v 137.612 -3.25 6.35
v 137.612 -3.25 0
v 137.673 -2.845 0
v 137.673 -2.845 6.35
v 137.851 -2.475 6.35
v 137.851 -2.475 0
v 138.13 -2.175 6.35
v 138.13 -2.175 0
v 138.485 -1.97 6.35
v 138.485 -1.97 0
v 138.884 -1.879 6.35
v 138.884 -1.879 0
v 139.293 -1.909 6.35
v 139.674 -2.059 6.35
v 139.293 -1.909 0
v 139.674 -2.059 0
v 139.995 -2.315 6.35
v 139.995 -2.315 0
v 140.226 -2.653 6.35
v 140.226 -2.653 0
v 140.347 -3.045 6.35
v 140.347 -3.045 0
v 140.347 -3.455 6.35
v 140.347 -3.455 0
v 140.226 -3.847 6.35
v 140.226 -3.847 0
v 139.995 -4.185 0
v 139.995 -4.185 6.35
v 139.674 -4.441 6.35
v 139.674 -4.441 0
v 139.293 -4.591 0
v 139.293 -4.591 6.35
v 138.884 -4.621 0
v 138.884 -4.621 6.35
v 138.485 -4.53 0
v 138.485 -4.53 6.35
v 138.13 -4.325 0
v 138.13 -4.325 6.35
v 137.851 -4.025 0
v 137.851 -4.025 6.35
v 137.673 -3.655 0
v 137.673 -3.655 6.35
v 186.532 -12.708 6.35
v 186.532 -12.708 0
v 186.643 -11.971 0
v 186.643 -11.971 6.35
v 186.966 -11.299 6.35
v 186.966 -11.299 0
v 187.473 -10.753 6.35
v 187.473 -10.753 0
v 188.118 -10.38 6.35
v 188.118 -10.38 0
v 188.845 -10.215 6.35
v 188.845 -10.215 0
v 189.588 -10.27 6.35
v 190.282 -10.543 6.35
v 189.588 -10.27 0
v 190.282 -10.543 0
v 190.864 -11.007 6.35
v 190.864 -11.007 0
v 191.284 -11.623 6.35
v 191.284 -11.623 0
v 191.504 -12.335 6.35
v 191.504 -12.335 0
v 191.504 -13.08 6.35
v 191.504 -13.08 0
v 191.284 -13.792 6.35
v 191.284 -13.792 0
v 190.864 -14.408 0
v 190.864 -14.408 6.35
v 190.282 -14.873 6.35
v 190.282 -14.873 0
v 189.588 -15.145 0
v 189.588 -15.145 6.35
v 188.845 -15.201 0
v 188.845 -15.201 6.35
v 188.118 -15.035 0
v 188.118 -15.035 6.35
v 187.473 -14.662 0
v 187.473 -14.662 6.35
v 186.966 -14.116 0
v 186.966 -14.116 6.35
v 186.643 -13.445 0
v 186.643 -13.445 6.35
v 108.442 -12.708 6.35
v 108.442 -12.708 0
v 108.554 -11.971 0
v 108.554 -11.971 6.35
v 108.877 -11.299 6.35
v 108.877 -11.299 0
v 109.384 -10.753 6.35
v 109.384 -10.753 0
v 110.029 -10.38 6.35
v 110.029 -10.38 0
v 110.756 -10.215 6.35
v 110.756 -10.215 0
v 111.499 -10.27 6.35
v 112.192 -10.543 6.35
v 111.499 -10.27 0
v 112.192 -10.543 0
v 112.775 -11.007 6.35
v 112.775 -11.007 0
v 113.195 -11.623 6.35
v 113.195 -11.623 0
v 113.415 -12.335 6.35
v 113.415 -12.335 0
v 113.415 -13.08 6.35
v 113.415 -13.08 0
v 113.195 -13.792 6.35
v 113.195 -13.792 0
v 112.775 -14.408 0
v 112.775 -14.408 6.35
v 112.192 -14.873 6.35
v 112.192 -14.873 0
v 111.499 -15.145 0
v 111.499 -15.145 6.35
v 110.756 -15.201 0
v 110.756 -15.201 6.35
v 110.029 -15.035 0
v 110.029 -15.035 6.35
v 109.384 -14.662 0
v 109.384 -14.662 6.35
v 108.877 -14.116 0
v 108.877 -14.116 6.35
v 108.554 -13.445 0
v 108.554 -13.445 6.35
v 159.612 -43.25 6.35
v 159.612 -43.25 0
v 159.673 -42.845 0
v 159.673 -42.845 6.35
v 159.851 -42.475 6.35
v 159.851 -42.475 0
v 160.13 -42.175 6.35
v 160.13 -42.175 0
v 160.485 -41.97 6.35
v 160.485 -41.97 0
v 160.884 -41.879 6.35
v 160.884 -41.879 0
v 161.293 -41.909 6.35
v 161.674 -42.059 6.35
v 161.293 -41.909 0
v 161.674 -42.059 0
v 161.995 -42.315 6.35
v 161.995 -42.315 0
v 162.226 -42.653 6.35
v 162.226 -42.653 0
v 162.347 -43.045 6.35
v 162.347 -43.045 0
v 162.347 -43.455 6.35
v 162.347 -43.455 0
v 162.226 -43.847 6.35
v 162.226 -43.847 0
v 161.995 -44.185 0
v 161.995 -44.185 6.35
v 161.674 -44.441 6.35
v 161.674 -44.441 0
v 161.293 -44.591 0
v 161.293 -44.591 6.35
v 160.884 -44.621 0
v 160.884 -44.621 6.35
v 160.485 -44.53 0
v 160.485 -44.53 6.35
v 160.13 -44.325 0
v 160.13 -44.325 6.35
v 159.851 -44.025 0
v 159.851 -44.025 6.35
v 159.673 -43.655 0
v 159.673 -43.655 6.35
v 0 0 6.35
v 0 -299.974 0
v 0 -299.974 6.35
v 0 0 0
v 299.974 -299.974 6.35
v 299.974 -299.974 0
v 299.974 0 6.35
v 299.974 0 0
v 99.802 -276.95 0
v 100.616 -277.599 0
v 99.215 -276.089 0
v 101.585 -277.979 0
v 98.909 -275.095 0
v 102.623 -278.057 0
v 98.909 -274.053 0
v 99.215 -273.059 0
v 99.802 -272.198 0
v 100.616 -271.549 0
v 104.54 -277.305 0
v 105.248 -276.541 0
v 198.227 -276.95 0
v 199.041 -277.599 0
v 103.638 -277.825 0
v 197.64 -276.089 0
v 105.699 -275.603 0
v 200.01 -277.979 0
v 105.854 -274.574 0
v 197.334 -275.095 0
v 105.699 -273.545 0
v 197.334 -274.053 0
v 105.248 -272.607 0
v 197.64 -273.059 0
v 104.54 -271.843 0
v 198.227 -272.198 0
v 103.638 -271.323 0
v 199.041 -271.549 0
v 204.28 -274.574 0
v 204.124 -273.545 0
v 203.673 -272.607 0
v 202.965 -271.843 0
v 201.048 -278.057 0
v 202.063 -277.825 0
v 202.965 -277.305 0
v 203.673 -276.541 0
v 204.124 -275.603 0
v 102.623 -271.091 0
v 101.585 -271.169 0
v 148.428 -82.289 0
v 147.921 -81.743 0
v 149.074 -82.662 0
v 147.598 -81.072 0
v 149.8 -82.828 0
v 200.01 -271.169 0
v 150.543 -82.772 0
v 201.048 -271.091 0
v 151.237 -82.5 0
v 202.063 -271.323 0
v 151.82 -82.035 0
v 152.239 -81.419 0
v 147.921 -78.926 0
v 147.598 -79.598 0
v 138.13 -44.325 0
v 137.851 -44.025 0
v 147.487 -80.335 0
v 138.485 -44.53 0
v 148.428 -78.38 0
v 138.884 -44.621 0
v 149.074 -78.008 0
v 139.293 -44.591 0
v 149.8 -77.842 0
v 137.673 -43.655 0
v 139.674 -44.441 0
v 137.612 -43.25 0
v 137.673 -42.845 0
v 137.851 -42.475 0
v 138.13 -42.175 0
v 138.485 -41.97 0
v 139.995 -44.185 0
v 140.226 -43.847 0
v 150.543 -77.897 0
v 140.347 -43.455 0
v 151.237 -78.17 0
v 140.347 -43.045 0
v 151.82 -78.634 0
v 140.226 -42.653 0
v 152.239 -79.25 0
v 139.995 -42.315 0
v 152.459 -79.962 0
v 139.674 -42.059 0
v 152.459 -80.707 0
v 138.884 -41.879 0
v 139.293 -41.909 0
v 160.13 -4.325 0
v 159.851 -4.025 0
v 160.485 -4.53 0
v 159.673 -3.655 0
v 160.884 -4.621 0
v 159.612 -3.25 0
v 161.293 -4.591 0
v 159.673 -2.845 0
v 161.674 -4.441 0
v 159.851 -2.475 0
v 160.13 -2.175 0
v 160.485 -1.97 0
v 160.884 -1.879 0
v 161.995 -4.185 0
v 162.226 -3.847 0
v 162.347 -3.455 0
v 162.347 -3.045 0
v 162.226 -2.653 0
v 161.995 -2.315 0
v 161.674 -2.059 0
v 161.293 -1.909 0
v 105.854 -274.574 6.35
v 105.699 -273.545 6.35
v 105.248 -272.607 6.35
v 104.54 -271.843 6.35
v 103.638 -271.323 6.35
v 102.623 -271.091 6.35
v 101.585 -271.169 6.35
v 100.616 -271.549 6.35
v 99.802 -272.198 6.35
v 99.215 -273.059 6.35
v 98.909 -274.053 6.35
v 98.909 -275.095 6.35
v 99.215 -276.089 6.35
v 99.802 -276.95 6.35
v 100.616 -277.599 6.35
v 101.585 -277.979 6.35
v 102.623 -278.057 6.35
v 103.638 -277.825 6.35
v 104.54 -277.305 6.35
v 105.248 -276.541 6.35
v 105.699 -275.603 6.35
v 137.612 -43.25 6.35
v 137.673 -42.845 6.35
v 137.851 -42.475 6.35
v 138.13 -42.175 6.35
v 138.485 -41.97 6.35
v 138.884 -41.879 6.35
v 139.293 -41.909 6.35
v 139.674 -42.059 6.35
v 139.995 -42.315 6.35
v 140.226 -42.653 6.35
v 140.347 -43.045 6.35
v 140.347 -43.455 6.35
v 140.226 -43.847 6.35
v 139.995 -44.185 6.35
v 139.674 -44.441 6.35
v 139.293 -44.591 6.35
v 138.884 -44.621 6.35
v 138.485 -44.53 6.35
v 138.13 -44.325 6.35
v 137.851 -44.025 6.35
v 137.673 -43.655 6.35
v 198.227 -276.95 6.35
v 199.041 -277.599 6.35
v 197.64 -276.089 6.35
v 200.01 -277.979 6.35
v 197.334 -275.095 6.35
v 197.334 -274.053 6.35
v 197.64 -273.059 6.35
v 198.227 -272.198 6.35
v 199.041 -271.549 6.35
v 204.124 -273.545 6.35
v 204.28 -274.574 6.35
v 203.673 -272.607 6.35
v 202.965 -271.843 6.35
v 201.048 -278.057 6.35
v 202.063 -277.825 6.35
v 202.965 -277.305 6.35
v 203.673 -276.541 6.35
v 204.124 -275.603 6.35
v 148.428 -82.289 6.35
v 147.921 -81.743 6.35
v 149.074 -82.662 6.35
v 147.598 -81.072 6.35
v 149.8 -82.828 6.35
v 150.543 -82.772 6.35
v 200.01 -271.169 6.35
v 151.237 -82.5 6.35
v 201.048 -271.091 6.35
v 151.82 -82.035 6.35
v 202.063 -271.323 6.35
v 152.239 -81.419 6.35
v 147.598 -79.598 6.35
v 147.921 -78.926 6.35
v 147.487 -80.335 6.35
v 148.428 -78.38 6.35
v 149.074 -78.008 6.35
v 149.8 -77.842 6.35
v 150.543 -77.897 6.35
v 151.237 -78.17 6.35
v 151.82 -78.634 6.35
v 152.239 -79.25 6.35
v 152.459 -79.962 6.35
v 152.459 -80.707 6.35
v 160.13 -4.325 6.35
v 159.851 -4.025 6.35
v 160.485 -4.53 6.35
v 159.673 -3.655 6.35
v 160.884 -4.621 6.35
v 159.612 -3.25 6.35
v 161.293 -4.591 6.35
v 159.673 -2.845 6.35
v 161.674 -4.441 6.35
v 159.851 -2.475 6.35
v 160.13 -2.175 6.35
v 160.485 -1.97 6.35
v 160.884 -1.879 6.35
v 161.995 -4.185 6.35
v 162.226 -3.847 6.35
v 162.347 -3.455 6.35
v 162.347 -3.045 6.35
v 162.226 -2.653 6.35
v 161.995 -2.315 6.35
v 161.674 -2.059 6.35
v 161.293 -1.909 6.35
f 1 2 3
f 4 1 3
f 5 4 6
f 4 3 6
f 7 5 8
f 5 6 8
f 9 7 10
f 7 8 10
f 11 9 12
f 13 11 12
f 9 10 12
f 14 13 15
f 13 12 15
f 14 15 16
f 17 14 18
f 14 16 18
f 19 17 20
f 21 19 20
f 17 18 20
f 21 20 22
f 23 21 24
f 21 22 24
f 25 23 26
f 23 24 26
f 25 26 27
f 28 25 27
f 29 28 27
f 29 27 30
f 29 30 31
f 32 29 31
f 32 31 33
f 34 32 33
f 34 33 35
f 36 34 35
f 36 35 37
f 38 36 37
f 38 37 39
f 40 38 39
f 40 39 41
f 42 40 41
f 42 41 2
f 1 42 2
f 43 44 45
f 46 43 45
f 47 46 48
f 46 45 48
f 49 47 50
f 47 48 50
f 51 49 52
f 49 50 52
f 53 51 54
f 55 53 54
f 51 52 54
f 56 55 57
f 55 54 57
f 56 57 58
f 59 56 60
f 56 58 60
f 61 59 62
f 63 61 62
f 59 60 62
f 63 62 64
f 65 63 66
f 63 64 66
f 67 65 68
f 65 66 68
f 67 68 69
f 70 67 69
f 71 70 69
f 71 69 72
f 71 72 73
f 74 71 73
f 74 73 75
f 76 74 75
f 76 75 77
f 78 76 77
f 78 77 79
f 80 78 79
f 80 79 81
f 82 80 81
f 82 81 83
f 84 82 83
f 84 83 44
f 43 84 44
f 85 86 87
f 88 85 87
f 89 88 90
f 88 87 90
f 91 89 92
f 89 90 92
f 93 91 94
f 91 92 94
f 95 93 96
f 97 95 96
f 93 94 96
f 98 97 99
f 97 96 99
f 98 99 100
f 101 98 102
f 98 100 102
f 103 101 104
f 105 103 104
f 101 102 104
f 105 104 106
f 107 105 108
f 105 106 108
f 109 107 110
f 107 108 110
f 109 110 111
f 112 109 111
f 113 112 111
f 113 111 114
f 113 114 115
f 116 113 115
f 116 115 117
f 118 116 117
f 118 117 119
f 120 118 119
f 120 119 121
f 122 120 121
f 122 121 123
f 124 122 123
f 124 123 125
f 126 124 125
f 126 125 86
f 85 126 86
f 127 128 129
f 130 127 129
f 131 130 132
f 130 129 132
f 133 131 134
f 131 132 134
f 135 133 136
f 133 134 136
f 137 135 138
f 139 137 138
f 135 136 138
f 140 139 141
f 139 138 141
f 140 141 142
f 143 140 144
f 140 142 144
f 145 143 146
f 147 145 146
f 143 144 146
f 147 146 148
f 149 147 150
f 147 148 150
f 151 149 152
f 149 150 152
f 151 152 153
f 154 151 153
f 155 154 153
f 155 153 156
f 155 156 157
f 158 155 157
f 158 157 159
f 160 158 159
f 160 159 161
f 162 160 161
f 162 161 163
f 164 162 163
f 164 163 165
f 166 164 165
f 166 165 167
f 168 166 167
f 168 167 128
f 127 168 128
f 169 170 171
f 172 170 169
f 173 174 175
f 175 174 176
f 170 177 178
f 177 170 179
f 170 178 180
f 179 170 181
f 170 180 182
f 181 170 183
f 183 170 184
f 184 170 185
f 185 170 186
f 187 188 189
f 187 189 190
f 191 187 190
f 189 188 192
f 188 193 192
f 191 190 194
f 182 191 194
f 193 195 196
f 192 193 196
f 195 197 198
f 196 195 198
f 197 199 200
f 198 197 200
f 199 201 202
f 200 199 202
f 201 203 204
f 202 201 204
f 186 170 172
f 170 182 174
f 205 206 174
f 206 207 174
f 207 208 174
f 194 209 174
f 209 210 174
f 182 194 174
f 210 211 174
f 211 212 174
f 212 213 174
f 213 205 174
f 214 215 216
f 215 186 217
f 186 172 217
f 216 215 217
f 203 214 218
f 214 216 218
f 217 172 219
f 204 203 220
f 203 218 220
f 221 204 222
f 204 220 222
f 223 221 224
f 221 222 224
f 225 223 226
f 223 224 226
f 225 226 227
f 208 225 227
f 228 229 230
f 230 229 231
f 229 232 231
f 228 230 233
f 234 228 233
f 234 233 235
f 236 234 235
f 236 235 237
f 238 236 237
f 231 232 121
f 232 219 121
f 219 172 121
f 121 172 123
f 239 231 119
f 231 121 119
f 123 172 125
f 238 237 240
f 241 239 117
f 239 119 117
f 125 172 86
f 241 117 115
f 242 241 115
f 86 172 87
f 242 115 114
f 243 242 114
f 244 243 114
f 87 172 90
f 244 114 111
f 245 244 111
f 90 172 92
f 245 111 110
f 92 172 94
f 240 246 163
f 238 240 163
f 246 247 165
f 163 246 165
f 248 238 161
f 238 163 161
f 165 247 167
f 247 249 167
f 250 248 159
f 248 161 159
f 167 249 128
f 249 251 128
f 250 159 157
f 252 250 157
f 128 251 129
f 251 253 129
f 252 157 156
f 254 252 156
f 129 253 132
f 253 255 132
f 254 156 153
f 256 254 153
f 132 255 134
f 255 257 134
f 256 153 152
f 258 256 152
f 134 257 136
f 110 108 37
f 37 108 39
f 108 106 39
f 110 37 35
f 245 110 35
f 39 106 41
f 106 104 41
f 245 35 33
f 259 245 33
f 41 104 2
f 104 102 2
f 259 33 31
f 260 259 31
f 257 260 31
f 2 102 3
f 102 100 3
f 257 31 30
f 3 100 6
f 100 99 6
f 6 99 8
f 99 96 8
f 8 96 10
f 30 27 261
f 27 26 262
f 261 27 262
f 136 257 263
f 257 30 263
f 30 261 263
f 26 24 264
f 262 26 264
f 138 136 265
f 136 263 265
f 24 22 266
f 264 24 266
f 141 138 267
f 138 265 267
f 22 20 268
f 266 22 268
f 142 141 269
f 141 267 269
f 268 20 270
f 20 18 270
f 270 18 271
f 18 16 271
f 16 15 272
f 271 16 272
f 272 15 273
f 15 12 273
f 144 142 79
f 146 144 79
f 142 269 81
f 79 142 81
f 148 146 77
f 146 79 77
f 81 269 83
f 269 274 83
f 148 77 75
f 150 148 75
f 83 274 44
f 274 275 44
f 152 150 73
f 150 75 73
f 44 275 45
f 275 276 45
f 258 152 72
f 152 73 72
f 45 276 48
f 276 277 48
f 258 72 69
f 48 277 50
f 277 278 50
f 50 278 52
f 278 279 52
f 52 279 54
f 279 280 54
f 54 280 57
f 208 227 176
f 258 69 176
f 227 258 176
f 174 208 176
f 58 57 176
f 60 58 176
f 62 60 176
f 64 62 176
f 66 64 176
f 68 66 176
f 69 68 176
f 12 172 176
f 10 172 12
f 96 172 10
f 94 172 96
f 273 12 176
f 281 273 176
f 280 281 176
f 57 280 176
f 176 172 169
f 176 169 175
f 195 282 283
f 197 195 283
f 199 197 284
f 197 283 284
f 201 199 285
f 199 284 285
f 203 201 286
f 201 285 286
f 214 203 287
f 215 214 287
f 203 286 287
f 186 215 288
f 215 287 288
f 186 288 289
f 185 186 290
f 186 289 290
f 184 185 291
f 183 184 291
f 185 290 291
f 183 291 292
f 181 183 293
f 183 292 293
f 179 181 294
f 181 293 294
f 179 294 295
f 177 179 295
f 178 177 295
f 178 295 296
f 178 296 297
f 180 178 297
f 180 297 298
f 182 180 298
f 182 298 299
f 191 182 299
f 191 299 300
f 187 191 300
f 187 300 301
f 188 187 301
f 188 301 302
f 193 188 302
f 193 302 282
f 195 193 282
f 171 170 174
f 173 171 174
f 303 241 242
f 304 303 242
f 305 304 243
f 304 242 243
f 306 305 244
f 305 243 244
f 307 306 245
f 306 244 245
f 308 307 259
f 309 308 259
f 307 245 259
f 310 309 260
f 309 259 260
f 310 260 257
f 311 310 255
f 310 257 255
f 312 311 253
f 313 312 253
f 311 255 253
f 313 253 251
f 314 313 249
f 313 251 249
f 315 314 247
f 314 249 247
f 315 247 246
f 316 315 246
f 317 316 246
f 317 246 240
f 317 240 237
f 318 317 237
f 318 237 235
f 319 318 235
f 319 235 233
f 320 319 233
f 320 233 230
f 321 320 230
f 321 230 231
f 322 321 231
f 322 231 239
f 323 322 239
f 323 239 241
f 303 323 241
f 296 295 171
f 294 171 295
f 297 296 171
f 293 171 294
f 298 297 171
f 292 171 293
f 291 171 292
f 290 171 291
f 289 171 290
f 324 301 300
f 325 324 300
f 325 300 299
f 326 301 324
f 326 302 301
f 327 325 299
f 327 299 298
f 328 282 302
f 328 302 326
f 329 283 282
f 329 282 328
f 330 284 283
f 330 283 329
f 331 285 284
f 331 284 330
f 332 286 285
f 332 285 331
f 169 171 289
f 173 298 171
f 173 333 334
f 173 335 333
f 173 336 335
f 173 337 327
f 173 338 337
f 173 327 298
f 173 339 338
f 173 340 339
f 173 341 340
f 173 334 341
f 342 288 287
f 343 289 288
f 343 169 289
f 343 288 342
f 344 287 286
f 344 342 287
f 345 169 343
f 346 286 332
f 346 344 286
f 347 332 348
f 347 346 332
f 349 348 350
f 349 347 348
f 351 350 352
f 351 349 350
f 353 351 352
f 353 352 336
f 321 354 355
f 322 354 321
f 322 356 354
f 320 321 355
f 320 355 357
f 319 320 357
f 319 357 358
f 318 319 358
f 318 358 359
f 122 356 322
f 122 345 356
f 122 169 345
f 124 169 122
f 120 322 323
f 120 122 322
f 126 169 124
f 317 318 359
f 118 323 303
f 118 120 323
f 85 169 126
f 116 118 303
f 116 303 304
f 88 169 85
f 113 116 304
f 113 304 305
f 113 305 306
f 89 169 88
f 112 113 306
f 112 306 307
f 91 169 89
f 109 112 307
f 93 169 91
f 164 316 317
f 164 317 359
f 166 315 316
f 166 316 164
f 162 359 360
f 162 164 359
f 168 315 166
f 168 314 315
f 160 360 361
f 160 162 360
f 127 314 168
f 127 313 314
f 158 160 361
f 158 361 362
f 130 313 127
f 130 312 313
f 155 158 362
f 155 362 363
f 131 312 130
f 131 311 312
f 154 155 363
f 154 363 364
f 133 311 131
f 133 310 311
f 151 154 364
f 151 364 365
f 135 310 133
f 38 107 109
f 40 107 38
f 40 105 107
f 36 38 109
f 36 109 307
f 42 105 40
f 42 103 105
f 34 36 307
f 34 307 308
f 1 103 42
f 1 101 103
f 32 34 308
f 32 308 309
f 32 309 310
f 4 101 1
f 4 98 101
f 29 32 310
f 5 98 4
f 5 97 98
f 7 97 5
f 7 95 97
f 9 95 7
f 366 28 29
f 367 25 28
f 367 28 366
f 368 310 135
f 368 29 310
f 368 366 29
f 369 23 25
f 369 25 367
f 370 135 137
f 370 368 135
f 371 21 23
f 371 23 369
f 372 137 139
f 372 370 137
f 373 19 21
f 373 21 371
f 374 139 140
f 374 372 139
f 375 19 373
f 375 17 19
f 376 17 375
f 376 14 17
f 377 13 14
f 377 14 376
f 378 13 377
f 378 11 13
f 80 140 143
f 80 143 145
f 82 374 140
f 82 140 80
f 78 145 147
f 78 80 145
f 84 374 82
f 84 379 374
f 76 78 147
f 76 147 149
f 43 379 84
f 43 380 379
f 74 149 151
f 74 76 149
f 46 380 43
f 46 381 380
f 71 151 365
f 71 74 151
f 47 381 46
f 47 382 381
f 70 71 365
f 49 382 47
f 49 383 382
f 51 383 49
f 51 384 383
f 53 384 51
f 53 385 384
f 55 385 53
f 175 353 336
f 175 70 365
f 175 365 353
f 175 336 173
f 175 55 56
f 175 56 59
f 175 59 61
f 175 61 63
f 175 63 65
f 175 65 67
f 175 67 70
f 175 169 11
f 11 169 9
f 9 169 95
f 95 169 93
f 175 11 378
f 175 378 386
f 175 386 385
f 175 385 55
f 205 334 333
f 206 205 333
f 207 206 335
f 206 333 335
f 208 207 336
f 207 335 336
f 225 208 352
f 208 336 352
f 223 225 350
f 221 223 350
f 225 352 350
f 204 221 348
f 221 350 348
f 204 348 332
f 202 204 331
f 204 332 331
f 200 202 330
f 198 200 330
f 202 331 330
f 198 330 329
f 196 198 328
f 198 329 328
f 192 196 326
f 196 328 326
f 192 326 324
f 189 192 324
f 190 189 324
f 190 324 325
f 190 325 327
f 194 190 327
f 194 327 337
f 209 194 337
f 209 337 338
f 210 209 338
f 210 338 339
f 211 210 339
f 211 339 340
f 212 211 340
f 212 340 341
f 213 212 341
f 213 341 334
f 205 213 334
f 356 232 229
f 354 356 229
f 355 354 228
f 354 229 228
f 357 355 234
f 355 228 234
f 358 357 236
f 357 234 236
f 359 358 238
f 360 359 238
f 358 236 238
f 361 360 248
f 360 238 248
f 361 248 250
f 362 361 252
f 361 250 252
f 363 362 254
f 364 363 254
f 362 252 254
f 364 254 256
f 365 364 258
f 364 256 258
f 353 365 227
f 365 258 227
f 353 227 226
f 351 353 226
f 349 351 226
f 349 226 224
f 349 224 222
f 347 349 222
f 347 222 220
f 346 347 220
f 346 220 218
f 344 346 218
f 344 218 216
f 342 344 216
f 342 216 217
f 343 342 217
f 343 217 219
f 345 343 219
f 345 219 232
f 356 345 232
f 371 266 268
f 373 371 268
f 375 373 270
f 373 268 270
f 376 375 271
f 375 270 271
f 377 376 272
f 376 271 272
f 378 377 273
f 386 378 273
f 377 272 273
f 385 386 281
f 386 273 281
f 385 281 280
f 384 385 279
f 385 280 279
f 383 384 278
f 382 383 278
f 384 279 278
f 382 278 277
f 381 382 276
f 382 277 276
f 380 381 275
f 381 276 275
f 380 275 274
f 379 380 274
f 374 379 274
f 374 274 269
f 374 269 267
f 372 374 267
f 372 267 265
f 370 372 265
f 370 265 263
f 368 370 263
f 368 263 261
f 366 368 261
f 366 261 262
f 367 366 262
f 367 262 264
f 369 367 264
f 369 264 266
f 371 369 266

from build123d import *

# Parameters (mm, degrees)
SKETCH1_W           = 299.974
SKETCH1_H           = 299.974
BOSS_EXTRUDE1_DEPTH = 6.35
SKETCH3_R           = 1.375
CUT_EXTRUDE1_DEPTH  = 425.274821138
SKETCH4_R           = 2.5
CUT_EXTRUDE2_DEPTH  = 425.274821138
SKETCH5_R           = 3.4925
CUT_EXTRUDE3_DEPTH  = 425.274821138


with BuildPart() as part:
    # Sketch1 → Boss-Extrude1 (new body)
    with BuildSketch(Plane.XY):
        with Locations((149.987, -149.987)):
            Rectangle(SKETCH1_W, SKETCH1_H)
    extrude(amount=BOSS_EXTRUDE1_DEPTH)

    # Sketch3 → Cut-Extrude1 (cut, through all)
    with BuildSketch(Plane(origin=(0, 0, 0), x_dir=(-1, 0, 0), z_dir=(0, 0, -1))):
        with Locations((-160.987, -3.25)):
            Circle(SKETCH3_R)
        with Locations((-138.987, -3.25)):
            Circle(SKETCH3_R)
        with Locations((-138.987, -43.25)):
            Circle(SKETCH3_R)
        with Locations((-160.987, -43.25)):
            Circle(SKETCH3_R)
    extrude(amount=-CUT_EXTRUDE1_DEPTH, mode=Mode.SUBTRACT)

    # Sketch4 → Cut-Extrude2 (cut, through all)
    with BuildSketch(Plane(origin=(0, 0, 0), x_dir=(-1, 0, 0), z_dir=(0, 0, -1))):
        with Locations((-189.031549179, -12.707619021)):
            Circle(SKETCH4_R)
        with Locations((-110.942450821, -12.707619021)):
            Circle(SKETCH4_R)
        with Locations((-149.987, -80.334761958)):
            Circle(SKETCH4_R)
    extrude(amount=-CUT_EXTRUDE2_DEPTH, mode=Mode.SUBTRACT)

    # Sketch5 → Cut-Extrude3 (cut, through all)
    with BuildSketch(Plane.XY.offset(6.35)):
        with Locations((200.787, -274.574)):
            Circle(SKETCH5_R)
        with Locations((102.362, -274.574)):
            Circle(SKETCH5_R)
    extrude(amount=-CUT_EXTRUDE3_DEPTH, mode=Mode.SUBTRACT)


solid = part.part
